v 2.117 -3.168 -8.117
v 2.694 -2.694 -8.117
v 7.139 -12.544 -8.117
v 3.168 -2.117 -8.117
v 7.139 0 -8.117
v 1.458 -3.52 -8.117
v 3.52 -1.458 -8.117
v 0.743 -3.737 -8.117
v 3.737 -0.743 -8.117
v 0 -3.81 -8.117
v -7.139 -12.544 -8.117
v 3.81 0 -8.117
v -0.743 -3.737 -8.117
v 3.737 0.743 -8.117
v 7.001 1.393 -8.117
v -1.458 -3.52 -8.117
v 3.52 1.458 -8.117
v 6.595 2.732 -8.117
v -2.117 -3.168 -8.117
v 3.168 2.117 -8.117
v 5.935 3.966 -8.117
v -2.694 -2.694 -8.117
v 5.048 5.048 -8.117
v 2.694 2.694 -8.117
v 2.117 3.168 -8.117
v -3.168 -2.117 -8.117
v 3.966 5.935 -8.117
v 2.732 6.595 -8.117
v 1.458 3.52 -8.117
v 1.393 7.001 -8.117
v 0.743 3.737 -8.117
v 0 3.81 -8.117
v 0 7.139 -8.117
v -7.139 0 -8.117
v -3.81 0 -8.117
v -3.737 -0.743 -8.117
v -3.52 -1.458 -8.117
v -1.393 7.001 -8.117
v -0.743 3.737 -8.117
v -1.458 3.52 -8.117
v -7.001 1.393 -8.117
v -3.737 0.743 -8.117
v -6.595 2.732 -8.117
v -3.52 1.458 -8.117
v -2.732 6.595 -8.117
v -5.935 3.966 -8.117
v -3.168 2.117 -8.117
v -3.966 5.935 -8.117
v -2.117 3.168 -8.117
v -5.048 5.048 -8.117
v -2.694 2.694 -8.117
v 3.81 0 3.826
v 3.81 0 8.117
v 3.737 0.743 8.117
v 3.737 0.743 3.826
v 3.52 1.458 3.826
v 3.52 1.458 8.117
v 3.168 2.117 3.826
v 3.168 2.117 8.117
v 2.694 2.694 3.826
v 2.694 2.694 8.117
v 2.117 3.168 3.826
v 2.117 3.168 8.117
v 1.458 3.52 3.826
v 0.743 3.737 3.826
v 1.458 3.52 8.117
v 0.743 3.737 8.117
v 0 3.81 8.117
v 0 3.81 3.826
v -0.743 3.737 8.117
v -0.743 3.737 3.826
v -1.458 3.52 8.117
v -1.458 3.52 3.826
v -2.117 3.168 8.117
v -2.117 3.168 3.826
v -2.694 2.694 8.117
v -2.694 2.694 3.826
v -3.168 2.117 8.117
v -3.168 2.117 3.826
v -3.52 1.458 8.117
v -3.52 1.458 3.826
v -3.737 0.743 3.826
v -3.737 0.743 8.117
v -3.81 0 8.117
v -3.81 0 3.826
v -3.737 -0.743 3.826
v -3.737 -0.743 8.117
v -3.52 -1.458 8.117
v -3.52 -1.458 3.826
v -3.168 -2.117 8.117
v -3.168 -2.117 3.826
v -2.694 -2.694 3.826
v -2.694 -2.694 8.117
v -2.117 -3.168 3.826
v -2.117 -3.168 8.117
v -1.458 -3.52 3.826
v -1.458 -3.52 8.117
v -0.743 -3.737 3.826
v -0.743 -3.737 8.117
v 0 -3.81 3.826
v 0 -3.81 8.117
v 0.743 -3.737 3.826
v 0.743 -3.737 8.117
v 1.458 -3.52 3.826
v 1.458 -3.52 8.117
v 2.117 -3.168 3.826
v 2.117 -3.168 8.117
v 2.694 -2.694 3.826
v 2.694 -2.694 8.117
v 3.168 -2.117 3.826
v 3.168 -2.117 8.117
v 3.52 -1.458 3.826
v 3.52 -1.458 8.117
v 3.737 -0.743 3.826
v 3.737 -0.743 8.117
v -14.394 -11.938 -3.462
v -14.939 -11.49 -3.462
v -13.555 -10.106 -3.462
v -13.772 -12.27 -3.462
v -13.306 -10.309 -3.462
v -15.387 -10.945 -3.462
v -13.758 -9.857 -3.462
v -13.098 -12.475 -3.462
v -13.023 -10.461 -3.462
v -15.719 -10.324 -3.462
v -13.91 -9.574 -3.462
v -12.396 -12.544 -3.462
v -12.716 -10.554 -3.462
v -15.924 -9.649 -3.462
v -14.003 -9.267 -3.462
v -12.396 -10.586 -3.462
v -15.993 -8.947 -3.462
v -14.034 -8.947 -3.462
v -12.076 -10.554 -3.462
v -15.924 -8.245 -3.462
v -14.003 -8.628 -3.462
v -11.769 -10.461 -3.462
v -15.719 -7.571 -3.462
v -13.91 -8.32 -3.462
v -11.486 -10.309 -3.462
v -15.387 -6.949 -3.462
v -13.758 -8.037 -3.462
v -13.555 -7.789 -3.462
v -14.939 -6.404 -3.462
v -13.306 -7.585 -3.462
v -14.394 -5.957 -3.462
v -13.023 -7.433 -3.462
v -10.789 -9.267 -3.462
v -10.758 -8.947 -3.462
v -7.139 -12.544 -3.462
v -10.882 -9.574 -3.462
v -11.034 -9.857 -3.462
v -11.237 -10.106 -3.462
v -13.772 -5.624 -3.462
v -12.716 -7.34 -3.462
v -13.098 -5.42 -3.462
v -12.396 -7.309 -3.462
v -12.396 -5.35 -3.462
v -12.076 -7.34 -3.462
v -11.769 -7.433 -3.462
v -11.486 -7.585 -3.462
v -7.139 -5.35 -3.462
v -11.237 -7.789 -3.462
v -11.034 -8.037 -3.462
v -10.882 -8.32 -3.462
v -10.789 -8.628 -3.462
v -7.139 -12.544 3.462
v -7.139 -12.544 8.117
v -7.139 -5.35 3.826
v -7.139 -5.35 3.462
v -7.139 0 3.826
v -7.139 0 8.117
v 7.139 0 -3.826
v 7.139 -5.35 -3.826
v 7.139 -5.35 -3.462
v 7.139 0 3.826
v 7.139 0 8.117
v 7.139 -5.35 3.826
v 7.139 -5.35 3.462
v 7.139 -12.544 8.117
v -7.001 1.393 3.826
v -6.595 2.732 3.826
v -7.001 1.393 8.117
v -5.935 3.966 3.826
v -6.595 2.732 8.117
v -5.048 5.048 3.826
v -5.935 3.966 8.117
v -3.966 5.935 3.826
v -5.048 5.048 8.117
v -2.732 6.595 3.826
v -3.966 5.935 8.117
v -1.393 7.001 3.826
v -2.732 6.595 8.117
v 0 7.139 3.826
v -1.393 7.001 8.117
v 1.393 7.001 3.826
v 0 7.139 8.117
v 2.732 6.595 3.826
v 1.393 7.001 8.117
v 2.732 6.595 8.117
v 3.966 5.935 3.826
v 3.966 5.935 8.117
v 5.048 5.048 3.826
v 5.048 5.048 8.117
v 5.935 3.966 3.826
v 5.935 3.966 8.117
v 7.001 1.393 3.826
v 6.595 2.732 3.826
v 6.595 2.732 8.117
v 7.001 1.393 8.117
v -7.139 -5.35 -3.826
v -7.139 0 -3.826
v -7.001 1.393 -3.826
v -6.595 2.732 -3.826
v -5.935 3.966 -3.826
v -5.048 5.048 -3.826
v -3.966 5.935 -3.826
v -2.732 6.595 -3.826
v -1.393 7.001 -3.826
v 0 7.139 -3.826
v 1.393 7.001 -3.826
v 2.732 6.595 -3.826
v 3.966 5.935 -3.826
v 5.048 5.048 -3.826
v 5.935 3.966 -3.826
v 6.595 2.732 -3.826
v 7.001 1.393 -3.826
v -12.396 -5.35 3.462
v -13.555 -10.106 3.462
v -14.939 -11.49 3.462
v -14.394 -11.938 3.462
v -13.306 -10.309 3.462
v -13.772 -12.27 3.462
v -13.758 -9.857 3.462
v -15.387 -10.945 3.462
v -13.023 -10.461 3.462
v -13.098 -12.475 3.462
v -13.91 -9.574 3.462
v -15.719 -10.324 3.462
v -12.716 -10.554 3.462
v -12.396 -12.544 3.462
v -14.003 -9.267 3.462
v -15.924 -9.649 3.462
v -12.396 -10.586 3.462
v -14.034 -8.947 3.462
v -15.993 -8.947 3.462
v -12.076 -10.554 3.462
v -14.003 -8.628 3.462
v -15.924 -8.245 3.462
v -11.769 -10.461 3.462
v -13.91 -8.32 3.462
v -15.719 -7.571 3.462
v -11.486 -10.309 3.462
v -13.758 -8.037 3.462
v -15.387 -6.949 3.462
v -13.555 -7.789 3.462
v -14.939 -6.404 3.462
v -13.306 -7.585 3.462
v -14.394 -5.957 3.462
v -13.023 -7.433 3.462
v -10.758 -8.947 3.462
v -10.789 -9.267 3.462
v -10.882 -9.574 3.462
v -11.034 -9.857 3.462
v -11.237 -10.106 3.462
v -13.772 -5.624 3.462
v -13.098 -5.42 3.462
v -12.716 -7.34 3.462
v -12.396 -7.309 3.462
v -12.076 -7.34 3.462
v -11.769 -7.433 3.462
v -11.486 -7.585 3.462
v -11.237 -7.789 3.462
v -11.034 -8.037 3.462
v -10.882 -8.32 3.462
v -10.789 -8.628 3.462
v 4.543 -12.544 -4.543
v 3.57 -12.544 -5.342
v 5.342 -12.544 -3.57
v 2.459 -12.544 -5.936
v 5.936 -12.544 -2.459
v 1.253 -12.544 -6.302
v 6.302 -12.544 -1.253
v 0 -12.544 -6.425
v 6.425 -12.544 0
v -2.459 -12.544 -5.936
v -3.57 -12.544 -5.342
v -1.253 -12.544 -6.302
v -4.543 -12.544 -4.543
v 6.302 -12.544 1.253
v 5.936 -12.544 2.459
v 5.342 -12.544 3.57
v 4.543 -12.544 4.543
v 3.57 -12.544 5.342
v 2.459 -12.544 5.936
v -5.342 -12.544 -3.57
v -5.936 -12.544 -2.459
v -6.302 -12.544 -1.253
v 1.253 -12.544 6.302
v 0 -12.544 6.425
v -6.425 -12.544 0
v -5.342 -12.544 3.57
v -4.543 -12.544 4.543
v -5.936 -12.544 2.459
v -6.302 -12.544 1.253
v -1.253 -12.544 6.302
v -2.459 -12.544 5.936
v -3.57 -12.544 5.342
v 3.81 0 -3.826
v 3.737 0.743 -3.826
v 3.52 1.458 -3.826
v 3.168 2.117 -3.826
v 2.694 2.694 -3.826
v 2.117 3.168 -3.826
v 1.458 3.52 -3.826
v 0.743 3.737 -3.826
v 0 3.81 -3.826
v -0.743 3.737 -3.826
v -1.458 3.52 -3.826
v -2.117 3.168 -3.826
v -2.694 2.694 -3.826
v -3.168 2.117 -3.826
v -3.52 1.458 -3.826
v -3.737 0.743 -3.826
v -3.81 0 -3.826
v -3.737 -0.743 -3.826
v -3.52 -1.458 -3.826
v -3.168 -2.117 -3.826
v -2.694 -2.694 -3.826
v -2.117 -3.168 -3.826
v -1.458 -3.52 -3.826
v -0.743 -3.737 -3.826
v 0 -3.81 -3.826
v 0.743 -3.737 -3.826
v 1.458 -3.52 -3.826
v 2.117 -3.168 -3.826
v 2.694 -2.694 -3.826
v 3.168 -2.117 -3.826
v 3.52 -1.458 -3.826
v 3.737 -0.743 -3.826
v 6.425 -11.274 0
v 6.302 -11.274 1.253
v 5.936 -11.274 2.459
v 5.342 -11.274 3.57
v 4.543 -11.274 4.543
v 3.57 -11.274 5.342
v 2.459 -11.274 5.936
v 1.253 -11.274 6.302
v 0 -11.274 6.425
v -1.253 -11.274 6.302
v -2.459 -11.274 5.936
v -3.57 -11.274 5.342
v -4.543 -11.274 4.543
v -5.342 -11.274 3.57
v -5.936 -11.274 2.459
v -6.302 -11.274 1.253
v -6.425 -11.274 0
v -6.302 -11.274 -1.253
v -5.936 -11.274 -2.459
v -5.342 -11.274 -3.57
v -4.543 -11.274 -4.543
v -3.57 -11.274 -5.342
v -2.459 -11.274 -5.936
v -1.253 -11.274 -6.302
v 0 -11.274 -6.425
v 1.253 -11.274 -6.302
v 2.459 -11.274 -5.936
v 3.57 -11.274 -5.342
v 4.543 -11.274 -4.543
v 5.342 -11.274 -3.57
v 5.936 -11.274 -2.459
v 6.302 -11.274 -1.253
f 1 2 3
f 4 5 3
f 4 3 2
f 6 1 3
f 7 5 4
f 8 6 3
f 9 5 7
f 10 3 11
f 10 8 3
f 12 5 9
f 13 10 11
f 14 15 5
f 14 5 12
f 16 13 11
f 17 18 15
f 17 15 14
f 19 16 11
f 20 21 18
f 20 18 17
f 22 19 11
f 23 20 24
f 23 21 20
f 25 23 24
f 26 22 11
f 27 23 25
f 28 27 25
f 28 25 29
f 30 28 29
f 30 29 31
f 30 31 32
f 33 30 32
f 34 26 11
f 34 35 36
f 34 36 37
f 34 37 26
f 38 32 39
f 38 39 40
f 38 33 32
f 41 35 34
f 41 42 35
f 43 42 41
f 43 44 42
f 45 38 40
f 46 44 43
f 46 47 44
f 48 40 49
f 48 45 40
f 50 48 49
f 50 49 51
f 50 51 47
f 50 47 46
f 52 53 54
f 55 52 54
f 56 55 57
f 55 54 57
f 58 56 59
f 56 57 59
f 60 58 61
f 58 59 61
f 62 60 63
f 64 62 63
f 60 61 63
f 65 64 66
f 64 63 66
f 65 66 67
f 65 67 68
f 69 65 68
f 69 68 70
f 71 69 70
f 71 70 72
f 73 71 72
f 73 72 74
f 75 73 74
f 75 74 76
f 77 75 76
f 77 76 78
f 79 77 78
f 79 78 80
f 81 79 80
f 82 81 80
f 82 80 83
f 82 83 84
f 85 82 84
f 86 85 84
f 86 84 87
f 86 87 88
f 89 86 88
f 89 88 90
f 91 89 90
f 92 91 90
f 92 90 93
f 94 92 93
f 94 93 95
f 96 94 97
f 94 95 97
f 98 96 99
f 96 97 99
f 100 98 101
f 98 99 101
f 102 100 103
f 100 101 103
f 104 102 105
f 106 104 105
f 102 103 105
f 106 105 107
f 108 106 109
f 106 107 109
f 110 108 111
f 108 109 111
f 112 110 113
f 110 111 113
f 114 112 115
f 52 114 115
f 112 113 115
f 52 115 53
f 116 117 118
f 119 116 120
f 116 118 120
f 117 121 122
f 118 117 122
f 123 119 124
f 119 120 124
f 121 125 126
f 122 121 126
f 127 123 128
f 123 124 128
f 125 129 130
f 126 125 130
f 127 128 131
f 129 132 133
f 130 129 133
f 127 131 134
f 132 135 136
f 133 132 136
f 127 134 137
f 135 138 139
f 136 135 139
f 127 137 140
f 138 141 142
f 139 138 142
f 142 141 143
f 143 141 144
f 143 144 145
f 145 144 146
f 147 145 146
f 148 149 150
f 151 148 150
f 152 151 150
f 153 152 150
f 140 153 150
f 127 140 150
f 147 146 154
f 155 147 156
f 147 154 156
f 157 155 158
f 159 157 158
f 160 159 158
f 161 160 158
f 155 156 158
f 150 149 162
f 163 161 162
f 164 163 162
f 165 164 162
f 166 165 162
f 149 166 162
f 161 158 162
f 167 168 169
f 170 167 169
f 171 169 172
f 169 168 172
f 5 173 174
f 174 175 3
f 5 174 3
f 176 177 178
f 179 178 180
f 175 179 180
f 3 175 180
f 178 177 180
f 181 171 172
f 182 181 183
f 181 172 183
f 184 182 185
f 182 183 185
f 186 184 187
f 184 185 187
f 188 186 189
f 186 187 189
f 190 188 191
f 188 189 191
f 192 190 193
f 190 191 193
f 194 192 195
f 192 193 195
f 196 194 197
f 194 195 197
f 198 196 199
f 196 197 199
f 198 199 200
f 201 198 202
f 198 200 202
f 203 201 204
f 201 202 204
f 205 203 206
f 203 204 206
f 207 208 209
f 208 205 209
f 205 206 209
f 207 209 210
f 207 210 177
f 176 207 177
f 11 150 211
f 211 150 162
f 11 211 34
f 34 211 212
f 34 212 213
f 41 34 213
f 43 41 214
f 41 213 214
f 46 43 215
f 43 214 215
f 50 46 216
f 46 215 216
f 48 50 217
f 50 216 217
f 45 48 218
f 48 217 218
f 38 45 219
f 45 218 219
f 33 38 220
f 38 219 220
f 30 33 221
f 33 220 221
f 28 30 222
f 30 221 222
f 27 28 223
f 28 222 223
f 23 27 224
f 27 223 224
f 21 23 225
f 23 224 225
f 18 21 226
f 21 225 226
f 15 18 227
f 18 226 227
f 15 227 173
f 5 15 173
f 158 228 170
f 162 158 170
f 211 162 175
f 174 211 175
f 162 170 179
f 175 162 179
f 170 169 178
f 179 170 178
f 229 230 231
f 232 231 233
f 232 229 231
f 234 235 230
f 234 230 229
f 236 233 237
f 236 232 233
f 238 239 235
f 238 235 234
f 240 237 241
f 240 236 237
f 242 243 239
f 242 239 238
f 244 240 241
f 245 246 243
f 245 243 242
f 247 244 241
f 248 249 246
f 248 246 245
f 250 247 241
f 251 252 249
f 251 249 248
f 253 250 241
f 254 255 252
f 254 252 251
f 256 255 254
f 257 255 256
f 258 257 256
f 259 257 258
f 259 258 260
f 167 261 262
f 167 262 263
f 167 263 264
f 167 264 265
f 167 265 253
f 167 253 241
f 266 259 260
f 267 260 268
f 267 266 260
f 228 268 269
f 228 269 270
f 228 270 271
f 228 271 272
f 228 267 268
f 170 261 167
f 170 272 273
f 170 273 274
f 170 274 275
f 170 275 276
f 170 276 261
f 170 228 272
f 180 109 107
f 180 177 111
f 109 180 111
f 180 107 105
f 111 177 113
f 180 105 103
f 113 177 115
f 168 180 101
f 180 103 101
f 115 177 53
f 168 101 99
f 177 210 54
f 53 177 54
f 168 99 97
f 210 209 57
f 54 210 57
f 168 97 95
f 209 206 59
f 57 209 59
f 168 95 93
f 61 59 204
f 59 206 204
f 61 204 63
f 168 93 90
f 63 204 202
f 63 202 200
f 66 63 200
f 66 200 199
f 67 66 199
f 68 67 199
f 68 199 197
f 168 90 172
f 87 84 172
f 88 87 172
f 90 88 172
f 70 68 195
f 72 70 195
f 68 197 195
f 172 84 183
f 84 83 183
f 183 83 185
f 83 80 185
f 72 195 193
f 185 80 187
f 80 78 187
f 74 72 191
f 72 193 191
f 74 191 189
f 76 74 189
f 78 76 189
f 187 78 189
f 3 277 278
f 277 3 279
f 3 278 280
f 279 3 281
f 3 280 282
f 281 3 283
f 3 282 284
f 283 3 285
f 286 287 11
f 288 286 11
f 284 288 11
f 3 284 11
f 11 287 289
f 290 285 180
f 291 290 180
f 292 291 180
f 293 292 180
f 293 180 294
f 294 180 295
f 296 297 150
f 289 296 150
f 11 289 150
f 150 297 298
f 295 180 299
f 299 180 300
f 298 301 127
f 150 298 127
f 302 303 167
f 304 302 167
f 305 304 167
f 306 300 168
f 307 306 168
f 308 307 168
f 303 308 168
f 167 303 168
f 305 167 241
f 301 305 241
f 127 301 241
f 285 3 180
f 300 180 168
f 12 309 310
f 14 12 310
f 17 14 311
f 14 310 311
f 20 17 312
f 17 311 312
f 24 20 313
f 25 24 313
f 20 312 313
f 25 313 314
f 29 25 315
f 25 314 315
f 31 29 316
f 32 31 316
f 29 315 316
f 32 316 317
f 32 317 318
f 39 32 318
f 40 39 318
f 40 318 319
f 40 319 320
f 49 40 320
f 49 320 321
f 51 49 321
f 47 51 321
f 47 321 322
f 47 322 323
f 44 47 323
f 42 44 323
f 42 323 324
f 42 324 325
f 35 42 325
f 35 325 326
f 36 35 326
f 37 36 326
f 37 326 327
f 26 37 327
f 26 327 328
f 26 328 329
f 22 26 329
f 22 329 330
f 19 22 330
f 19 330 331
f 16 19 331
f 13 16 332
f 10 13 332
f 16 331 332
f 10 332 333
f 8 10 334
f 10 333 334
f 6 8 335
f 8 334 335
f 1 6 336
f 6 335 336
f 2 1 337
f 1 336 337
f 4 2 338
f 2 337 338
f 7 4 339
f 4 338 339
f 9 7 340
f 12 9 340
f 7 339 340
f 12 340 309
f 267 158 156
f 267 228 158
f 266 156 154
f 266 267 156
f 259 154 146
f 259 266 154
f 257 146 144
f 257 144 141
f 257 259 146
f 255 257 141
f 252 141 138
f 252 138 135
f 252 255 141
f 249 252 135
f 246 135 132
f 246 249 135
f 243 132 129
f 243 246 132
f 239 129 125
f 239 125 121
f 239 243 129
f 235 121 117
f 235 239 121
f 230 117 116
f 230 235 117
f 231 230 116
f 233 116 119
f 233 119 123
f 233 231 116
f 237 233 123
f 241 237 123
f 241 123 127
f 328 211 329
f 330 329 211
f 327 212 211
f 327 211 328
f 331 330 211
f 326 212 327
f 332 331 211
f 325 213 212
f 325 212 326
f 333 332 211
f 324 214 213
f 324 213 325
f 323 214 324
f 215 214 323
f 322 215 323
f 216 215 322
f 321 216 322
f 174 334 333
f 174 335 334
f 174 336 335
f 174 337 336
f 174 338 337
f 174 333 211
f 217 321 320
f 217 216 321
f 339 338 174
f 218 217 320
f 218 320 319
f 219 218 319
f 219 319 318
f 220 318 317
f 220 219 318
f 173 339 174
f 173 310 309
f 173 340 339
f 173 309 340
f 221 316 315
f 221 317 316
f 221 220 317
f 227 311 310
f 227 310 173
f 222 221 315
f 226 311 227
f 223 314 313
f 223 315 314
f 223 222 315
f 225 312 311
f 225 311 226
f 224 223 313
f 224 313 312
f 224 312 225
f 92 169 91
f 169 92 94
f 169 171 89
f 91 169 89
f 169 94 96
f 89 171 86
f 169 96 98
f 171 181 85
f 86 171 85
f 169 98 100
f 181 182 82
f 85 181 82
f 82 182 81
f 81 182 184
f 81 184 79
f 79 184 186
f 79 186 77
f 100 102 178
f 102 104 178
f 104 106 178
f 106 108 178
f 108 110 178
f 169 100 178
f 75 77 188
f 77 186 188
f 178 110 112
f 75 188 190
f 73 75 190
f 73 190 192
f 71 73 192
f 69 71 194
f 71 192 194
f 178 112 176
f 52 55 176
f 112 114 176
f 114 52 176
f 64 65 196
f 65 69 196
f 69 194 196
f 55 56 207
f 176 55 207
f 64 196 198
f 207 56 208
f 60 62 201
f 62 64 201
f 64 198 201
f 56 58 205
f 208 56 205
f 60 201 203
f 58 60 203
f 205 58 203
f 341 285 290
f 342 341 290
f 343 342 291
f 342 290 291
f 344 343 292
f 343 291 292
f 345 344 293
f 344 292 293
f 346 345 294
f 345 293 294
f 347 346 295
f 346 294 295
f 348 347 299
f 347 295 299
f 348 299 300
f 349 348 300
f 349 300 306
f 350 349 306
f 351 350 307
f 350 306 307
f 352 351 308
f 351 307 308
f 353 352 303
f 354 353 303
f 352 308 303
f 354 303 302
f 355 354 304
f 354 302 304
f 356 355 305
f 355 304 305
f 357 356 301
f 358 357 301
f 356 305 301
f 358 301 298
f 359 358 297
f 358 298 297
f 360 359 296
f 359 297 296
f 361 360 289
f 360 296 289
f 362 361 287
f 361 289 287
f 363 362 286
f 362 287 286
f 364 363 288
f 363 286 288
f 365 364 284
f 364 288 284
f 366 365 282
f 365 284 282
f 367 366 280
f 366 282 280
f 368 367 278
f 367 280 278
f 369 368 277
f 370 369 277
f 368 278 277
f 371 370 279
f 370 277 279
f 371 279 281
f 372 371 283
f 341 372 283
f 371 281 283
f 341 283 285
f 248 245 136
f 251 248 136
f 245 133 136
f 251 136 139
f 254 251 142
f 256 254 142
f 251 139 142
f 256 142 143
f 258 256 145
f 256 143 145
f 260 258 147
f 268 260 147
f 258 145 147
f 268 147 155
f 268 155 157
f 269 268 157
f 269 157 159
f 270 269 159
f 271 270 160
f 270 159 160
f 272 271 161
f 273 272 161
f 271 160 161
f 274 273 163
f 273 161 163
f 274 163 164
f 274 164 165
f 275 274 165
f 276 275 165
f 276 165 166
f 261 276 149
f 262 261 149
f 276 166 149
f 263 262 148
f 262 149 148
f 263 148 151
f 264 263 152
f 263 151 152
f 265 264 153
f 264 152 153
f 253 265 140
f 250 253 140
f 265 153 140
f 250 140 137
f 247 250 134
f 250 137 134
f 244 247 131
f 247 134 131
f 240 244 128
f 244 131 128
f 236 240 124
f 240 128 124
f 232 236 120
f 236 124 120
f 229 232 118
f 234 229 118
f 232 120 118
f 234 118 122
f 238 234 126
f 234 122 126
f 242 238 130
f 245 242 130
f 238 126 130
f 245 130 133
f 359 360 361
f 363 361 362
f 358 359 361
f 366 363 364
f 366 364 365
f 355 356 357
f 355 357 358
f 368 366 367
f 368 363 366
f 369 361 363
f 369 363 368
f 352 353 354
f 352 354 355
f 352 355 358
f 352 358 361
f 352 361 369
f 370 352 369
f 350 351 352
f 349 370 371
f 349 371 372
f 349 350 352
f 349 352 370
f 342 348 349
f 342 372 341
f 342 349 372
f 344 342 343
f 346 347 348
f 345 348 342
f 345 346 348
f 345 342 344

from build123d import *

# Parameters (mm, degrees)
EXTRUDE1_DEPTH     = 8.116924898
SKETCH2_W          = 56.161836645
SKETCH2_H          = 29.756220801
EXTRUDE2_DEPTH     = 3.825672251
SKETCH3_R          = 3.81
EXTRUDE3_DEPTH     = 22.721965672
SKETCH4_R          = 6.425
CUT_EXTRUDE1_DEPTH = 1.27
SKETCH6_R          = 1.638383055
EXTRUDE4_DEPTH     = 3.462479646
EXTRUDE5_DEPTH     = 24.392223233


with BuildPart() as part:
    # Sketch1 → Extrude1 (new, symmetric)
    with BuildSketch(Plane.XY):
        with BuildLine():
            Line((-7.138522943, -12.54381934), (-7.138522943, 0))
            ThreePointArc((-7.138522943, 0), (0, 7.138522943), (7.138522943, 0))
            Line((7.138522943, 0), (7.138522943, -12.54381934))
            Line((7.138522943, -12.54381934), (-7.138522943, -12.54381934))
        make_face()
    extrude(amount=EXTRUDE1_DEPTH, both=True)

    # Sketch2 → Extrude2 (cut, symmetric)
    with BuildSketch(Plane.XY):
        with Locations((-1.286243087, 9.527651968)):
            Rectangle(SKETCH2_W, SKETCH2_H)
    extrude(amount=EXTRUDE2_DEPTH, both=True, mode=Mode.SUBTRACT)

    # Sketch3 → Extrude3 (cut, through all)
    with BuildSketch(Plane.XY.offset(8.116924898)):
        Circle(SKETCH3_R)
    extrude(amount=-EXTRUDE3_DEPTH, mode=Mode.SUBTRACT)

    # Sketch4 → Cut-Extrude1 (cut)
    with BuildSketch(Plane.XZ.offset(12.54381934)):
        Circle(SKETCH4_R)
    extrude(amount=-CUT_EXTRUDE1_DEPTH, mode=Mode.SUBTRACT)

    # Sketch6 → Extrude4 (add, symmetric)
    with BuildSketch(Plane.XY):
        with BuildLine():
            Line((7.138522943, -12.54381934), (7.138522943, -5.350458433))
            Line((7.138522943, -5.350458433), (12.396008331, -5.350458433))
            ThreePointArc((12.396008331, -5.350458433), (15.992688785, -8.947138887), (12.396008331, -12.54381934))
            Line((12.396008331, -12.54381934), (7.138522943, -12.54381934))
        make_face()
        with Locations((12.396008331, -8.947138887)):
            Circle(SKETCH6_R, mode=Mode.SUBTRACT)
    extrude4 = extrude(amount=EXTRUDE4_DEPTH, both=True)

    # Mirror1: Extrude4 across plane
    add(extrude4.mirror(Plane(origin=(0, 0, 0), x_dir=(0, 0, 1), z_dir=(1, 0, 0))))

    # Sketch7 → Extrude5 (cut, through all)
    with BuildSketch(Plane.XY.offset(3.462479646)):
        with BuildLine():
            Line((7.138522943, -12.54381934), (12.396008331, -12.54381934))
            ThreePointArc((12.396008331, -12.54381934), (15.992688785, -8.947138887), (12.396008331, -5.350458433))
            Line((12.396008331, -5.350458433), (7.138522943, -5.350458433))
            Line((7.138522943, -5.350458433), (7.138522943, -12.54381934))
        make_face()
    extrude(amount=-EXTRUDE5_DEPTH, mode=Mode.SUBTRACT)


solid = part.part
